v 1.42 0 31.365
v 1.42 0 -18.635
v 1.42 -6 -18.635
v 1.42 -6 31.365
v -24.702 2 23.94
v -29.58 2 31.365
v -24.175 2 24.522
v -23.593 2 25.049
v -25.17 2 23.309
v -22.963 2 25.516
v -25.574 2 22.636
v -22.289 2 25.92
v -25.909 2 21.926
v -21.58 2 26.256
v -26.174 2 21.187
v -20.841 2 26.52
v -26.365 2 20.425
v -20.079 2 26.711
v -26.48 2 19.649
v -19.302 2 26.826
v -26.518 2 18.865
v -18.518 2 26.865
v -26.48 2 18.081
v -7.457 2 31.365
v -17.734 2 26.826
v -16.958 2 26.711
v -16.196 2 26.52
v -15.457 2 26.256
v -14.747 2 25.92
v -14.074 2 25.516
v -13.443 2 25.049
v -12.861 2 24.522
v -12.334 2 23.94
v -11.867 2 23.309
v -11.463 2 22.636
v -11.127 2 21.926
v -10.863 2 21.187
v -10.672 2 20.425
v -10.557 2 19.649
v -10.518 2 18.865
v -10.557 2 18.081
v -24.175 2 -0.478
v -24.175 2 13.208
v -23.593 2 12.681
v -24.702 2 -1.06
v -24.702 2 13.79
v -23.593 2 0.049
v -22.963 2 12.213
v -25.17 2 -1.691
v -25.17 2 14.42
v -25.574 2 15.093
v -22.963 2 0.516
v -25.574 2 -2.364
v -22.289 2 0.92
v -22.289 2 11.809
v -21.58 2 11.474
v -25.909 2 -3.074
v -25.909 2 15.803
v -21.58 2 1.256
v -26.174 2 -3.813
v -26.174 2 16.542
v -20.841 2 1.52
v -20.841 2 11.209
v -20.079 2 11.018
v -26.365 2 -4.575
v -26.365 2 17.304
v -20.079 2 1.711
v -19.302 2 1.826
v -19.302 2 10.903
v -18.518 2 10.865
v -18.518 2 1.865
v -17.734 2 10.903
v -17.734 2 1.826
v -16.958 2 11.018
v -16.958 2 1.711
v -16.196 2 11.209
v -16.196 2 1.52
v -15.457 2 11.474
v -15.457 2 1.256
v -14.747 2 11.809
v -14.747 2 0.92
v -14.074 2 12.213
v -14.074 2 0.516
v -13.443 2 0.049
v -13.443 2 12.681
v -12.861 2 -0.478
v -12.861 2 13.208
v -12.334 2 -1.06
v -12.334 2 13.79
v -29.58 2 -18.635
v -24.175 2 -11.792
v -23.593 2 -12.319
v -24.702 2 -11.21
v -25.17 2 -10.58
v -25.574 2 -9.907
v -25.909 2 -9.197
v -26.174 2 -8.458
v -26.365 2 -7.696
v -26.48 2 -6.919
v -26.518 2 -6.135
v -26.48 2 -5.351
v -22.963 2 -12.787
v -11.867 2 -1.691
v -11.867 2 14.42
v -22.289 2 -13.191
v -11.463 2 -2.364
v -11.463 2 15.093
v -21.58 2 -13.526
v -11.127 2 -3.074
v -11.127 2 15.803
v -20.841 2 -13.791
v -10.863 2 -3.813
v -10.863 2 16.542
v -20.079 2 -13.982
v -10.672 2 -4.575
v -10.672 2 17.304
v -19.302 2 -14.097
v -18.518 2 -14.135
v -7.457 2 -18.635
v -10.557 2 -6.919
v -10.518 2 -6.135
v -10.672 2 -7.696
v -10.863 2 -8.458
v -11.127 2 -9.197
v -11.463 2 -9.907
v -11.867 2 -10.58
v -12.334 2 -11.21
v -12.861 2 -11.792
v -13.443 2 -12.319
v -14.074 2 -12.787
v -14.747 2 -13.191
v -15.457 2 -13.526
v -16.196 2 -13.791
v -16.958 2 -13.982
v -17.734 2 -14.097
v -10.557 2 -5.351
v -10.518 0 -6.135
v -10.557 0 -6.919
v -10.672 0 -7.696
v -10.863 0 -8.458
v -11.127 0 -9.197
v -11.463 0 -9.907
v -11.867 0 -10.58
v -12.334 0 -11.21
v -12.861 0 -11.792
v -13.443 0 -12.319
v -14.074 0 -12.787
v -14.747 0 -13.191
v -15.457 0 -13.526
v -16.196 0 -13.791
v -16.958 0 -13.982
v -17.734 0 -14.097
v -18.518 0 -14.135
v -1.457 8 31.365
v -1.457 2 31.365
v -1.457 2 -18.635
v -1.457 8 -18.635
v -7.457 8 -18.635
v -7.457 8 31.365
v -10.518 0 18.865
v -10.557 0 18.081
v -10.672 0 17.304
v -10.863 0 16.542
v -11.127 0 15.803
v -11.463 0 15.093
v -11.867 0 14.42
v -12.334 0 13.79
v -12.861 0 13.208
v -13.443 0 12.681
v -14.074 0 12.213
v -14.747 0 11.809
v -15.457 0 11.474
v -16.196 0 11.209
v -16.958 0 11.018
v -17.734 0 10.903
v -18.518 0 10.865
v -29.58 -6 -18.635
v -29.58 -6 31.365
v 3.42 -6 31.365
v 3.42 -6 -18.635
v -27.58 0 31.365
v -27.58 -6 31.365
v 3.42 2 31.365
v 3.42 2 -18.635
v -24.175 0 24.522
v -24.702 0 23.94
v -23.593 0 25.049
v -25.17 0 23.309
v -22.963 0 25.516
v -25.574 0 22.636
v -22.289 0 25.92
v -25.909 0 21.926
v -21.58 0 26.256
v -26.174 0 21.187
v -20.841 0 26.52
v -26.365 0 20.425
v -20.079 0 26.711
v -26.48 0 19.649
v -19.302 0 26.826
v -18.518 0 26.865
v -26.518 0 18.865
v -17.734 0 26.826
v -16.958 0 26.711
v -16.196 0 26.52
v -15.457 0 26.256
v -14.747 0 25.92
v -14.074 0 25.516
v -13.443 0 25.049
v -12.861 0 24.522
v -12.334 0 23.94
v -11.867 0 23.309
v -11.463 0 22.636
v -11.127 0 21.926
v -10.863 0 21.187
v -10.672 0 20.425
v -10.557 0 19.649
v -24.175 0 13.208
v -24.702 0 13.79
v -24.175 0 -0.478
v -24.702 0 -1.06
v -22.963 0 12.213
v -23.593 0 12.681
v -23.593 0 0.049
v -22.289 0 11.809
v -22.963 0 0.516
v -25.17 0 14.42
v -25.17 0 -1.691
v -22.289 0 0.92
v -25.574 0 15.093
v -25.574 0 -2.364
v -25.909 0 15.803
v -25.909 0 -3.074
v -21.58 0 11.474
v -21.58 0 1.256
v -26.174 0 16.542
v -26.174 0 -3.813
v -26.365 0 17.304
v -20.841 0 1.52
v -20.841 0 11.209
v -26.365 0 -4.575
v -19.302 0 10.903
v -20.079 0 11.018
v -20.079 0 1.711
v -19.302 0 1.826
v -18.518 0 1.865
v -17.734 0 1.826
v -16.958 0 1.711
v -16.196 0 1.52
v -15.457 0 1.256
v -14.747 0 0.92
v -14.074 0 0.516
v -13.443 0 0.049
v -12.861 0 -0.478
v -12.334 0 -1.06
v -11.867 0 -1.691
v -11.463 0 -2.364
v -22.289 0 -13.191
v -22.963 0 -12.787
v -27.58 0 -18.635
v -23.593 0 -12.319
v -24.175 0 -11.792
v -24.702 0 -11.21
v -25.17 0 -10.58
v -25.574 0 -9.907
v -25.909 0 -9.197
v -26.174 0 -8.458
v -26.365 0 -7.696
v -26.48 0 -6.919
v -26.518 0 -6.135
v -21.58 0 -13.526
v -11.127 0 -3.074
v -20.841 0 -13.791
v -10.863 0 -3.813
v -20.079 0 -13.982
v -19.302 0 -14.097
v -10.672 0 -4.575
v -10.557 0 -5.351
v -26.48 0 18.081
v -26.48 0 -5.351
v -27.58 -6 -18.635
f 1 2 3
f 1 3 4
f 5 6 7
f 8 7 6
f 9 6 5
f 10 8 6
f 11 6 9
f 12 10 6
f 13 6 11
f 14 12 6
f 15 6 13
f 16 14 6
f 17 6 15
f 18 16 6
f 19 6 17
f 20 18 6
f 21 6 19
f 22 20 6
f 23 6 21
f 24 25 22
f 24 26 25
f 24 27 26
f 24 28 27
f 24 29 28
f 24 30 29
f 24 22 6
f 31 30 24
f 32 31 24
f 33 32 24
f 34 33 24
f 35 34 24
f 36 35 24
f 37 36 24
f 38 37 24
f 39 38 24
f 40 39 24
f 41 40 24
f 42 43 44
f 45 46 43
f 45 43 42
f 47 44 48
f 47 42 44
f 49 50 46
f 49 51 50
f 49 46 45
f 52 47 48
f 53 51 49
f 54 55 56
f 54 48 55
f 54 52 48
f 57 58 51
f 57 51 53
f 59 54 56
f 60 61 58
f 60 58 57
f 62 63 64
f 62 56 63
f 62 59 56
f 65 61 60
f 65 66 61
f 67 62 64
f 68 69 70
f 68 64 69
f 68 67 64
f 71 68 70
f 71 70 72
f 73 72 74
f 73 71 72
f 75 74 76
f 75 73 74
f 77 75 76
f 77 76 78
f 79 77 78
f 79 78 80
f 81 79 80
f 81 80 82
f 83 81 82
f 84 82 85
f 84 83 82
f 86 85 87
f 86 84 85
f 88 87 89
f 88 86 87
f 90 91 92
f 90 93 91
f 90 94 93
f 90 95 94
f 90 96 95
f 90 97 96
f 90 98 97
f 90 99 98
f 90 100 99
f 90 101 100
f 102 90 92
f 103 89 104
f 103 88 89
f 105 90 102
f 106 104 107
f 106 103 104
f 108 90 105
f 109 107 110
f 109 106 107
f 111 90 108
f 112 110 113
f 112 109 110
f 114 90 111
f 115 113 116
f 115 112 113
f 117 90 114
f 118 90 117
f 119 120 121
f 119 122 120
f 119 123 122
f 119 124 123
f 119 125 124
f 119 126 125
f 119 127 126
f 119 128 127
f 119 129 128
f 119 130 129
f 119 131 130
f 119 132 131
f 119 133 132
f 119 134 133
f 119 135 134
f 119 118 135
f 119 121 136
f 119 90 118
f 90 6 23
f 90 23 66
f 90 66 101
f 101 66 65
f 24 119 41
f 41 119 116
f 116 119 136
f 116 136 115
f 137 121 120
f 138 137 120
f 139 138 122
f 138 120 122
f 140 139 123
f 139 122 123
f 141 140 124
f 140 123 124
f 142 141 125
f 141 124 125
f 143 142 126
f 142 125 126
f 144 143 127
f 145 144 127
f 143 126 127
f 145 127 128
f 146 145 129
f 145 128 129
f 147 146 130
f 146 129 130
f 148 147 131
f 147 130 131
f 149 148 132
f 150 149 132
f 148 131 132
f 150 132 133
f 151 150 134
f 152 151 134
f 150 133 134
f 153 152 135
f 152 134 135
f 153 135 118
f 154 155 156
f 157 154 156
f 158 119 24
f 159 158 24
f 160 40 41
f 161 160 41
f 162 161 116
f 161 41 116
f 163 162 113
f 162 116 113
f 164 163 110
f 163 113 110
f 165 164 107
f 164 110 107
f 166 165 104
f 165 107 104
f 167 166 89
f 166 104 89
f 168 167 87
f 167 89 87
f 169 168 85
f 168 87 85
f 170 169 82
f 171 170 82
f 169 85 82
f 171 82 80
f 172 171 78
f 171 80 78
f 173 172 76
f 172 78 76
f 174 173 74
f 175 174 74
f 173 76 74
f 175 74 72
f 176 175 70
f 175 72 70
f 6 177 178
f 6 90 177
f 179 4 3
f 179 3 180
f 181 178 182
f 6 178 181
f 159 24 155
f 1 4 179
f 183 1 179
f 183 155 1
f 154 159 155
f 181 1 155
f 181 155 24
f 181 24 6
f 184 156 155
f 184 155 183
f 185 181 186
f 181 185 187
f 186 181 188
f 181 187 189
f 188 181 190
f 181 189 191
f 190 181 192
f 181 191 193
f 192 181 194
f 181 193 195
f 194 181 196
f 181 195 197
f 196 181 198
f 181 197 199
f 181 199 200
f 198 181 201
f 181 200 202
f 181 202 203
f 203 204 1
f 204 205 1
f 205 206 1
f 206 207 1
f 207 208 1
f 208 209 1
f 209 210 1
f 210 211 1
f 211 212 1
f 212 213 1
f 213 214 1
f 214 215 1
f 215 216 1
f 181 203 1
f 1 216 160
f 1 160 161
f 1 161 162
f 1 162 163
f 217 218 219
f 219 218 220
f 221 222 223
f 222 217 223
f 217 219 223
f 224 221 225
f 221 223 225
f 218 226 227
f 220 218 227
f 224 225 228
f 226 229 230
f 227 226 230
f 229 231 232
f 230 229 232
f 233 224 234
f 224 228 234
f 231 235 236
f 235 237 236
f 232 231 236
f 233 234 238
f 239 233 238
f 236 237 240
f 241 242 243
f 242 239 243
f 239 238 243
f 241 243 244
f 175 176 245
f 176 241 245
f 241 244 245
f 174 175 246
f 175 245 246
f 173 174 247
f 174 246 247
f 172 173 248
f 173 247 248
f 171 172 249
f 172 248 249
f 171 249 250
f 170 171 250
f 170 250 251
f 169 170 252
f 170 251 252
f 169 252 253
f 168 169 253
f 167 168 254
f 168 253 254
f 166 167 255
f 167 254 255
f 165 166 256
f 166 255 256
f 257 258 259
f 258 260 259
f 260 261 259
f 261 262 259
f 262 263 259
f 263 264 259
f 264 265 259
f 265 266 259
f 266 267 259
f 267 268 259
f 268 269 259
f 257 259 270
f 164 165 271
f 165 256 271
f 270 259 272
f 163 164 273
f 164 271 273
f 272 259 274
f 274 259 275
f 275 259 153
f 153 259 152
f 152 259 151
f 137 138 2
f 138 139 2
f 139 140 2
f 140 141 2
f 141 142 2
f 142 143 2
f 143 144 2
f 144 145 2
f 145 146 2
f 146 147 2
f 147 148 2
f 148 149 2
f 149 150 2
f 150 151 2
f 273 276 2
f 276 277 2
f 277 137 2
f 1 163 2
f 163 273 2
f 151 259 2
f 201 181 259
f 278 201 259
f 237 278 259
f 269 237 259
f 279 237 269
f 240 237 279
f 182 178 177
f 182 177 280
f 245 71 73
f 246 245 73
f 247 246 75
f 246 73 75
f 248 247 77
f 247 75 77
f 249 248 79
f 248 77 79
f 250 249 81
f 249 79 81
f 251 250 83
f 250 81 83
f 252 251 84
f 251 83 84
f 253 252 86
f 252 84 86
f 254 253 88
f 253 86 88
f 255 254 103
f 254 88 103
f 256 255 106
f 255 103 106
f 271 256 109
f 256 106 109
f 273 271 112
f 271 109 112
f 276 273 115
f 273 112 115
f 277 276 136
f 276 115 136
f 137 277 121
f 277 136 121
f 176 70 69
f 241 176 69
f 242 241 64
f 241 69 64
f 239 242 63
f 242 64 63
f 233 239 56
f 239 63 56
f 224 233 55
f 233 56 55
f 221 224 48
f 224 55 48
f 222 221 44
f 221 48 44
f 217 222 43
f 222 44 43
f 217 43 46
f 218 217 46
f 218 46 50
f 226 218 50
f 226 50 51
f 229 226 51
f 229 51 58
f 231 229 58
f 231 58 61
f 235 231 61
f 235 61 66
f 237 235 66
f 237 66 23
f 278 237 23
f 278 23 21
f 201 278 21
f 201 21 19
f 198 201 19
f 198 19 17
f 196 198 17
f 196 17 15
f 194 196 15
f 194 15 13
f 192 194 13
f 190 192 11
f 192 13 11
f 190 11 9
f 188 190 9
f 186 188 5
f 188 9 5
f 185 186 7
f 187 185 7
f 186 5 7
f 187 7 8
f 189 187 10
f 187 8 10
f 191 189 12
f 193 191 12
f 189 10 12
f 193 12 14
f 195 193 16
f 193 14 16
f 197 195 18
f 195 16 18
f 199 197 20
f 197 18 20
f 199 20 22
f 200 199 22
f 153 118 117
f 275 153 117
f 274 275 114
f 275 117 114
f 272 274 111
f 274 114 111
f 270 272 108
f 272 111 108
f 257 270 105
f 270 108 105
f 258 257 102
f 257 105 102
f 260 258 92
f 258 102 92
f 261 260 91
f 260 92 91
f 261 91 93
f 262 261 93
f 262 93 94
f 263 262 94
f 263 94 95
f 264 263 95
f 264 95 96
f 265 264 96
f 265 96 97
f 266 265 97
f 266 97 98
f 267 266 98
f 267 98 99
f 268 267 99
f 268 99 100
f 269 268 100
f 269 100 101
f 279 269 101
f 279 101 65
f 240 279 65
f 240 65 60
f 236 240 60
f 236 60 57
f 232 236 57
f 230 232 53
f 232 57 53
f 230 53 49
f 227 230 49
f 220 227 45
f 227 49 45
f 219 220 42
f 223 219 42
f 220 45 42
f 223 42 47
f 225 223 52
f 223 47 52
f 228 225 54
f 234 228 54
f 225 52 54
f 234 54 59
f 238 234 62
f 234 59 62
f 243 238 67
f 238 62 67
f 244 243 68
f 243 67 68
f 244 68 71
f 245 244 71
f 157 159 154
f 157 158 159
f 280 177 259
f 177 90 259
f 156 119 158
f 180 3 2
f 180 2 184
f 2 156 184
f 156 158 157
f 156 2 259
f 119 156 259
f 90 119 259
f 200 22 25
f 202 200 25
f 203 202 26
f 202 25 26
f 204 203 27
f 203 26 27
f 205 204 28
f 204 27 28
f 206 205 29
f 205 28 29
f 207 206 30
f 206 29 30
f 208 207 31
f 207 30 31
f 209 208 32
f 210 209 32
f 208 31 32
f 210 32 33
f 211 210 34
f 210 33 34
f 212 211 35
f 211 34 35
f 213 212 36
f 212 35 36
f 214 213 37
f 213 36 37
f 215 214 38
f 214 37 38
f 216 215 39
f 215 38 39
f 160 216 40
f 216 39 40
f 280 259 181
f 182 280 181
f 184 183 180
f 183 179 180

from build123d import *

# Parameters (mm, degrees)
SKETCH1_W           = 33
SKETCH1_H           = 50
BOSS_EXTRUDE1_DEPTH = 2
SKETCH2_W           = 2
SKETCH2_H           = 50
BOSS_EXTRUDE2_DEPTH = 6
BOSS_EXTRUDE3_DEPTH = 6
CUT_EXTRUDE1_DEPTH  = 6


with BuildPart() as part:
    # Sketch1 → Boss-Extrude1 (new body)
    with BuildSketch(Plane(origin=(0, 0, 0), x_dir=(1, 0, 0), z_dir=(0, 1, 0))):
        with Locations((-13.079672346, -6.364652574)):
            Rectangle(SKETCH1_W, SKETCH1_H)
    extrude(amount=BOSS_EXTRUDE1_DEPTH)

    # Sketch2 → Boss-Extrude2 (add)
    with BuildSketch(Plane.XZ):
        with Locations((-28.579672346, 6.364652574)):
            Rectangle(SKETCH2_W, SKETCH2_H)
        with Locations((2.420327654, 6.364652574)):
            Rectangle(SKETCH2_W, SKETCH2_H)
    extrude(amount=BOSS_EXTRUDE2_DEPTH)

    # Sketch3 → Boss-Extrude3 (add)
    with BuildSketch(Plane(origin=(0, 2, 0), x_dir=(1, 0, 0), z_dir=(0, 1, 0))):
        Polygon((-1.456888389, -6.364652574), (-4.456888389, -6.364652574), (-7.456888389, -6.364652574), (-7.456888389, -31.364652574), (-1.456888389, -31.364652574), align=None)
        Polygon((-7.456888389, -6.364652574), (-4.456888389, -6.364652574), (-1.456888389, -6.364652574), (-1.456888389, 18.635347426), (-7.456888389, 18.635347426), align=None)
    extrude(amount=BOSS_EXTRUDE3_DEPTH)

    # Sketch4 → Cut-Extrude1 (cut)
    with BuildSketch(Plane(origin=(0, 2, 0), x_dir=(1, 0, 0), z_dir=(0, 1, 0))):
        with BuildLine():
            ThreePointArc((-10.518280368, -18.864652574), (-12.861426118, -13.207798324), (-18.518280368, -10.864652574))
            Line((-18.518280368, -10.864652574), (-18.518280368, -26.864652574))
            ThreePointArc((-18.518280368, -26.864652574), (-12.861426118, -24.521506823), (-10.518280368, -18.864652574))
        make_face()
        with BuildLine():
            Line((-18.518280368, -26.864652574), (-18.518280368, -10.864652574))
            ThreePointArc((-18.518280368, -10.864652574), (-26.518280368, -18.864652574), (-18.518280368, -26.864652574))
        make_face()
        with BuildLine():
            ThreePointArc((-18.518280368, 14.135347426), (-26.518280368, 6.135347426), (-18.518280368, -1.864652574))
            Line((-18.518280368, -1.864652574), (-18.518280368, 14.135347426))
        make_face()
        with BuildLine():
            Line((-18.518280368, 14.135347426), (-18.518280368, -1.864652574))
            ThreePointArc((-18.518280368, -1.864652574), (-12.861426118, 0.478493177), (-10.518280368, 6.135347426))
            ThreePointArc((-10.518280368, 6.135347426), (-12.861426118, 11.792201676), (-18.518280368, 14.135347426))
        make_face()
    extrude(amount=-CUT_EXTRUDE1_DEPTH, mode=Mode.SUBTRACT)


solid = part.part
